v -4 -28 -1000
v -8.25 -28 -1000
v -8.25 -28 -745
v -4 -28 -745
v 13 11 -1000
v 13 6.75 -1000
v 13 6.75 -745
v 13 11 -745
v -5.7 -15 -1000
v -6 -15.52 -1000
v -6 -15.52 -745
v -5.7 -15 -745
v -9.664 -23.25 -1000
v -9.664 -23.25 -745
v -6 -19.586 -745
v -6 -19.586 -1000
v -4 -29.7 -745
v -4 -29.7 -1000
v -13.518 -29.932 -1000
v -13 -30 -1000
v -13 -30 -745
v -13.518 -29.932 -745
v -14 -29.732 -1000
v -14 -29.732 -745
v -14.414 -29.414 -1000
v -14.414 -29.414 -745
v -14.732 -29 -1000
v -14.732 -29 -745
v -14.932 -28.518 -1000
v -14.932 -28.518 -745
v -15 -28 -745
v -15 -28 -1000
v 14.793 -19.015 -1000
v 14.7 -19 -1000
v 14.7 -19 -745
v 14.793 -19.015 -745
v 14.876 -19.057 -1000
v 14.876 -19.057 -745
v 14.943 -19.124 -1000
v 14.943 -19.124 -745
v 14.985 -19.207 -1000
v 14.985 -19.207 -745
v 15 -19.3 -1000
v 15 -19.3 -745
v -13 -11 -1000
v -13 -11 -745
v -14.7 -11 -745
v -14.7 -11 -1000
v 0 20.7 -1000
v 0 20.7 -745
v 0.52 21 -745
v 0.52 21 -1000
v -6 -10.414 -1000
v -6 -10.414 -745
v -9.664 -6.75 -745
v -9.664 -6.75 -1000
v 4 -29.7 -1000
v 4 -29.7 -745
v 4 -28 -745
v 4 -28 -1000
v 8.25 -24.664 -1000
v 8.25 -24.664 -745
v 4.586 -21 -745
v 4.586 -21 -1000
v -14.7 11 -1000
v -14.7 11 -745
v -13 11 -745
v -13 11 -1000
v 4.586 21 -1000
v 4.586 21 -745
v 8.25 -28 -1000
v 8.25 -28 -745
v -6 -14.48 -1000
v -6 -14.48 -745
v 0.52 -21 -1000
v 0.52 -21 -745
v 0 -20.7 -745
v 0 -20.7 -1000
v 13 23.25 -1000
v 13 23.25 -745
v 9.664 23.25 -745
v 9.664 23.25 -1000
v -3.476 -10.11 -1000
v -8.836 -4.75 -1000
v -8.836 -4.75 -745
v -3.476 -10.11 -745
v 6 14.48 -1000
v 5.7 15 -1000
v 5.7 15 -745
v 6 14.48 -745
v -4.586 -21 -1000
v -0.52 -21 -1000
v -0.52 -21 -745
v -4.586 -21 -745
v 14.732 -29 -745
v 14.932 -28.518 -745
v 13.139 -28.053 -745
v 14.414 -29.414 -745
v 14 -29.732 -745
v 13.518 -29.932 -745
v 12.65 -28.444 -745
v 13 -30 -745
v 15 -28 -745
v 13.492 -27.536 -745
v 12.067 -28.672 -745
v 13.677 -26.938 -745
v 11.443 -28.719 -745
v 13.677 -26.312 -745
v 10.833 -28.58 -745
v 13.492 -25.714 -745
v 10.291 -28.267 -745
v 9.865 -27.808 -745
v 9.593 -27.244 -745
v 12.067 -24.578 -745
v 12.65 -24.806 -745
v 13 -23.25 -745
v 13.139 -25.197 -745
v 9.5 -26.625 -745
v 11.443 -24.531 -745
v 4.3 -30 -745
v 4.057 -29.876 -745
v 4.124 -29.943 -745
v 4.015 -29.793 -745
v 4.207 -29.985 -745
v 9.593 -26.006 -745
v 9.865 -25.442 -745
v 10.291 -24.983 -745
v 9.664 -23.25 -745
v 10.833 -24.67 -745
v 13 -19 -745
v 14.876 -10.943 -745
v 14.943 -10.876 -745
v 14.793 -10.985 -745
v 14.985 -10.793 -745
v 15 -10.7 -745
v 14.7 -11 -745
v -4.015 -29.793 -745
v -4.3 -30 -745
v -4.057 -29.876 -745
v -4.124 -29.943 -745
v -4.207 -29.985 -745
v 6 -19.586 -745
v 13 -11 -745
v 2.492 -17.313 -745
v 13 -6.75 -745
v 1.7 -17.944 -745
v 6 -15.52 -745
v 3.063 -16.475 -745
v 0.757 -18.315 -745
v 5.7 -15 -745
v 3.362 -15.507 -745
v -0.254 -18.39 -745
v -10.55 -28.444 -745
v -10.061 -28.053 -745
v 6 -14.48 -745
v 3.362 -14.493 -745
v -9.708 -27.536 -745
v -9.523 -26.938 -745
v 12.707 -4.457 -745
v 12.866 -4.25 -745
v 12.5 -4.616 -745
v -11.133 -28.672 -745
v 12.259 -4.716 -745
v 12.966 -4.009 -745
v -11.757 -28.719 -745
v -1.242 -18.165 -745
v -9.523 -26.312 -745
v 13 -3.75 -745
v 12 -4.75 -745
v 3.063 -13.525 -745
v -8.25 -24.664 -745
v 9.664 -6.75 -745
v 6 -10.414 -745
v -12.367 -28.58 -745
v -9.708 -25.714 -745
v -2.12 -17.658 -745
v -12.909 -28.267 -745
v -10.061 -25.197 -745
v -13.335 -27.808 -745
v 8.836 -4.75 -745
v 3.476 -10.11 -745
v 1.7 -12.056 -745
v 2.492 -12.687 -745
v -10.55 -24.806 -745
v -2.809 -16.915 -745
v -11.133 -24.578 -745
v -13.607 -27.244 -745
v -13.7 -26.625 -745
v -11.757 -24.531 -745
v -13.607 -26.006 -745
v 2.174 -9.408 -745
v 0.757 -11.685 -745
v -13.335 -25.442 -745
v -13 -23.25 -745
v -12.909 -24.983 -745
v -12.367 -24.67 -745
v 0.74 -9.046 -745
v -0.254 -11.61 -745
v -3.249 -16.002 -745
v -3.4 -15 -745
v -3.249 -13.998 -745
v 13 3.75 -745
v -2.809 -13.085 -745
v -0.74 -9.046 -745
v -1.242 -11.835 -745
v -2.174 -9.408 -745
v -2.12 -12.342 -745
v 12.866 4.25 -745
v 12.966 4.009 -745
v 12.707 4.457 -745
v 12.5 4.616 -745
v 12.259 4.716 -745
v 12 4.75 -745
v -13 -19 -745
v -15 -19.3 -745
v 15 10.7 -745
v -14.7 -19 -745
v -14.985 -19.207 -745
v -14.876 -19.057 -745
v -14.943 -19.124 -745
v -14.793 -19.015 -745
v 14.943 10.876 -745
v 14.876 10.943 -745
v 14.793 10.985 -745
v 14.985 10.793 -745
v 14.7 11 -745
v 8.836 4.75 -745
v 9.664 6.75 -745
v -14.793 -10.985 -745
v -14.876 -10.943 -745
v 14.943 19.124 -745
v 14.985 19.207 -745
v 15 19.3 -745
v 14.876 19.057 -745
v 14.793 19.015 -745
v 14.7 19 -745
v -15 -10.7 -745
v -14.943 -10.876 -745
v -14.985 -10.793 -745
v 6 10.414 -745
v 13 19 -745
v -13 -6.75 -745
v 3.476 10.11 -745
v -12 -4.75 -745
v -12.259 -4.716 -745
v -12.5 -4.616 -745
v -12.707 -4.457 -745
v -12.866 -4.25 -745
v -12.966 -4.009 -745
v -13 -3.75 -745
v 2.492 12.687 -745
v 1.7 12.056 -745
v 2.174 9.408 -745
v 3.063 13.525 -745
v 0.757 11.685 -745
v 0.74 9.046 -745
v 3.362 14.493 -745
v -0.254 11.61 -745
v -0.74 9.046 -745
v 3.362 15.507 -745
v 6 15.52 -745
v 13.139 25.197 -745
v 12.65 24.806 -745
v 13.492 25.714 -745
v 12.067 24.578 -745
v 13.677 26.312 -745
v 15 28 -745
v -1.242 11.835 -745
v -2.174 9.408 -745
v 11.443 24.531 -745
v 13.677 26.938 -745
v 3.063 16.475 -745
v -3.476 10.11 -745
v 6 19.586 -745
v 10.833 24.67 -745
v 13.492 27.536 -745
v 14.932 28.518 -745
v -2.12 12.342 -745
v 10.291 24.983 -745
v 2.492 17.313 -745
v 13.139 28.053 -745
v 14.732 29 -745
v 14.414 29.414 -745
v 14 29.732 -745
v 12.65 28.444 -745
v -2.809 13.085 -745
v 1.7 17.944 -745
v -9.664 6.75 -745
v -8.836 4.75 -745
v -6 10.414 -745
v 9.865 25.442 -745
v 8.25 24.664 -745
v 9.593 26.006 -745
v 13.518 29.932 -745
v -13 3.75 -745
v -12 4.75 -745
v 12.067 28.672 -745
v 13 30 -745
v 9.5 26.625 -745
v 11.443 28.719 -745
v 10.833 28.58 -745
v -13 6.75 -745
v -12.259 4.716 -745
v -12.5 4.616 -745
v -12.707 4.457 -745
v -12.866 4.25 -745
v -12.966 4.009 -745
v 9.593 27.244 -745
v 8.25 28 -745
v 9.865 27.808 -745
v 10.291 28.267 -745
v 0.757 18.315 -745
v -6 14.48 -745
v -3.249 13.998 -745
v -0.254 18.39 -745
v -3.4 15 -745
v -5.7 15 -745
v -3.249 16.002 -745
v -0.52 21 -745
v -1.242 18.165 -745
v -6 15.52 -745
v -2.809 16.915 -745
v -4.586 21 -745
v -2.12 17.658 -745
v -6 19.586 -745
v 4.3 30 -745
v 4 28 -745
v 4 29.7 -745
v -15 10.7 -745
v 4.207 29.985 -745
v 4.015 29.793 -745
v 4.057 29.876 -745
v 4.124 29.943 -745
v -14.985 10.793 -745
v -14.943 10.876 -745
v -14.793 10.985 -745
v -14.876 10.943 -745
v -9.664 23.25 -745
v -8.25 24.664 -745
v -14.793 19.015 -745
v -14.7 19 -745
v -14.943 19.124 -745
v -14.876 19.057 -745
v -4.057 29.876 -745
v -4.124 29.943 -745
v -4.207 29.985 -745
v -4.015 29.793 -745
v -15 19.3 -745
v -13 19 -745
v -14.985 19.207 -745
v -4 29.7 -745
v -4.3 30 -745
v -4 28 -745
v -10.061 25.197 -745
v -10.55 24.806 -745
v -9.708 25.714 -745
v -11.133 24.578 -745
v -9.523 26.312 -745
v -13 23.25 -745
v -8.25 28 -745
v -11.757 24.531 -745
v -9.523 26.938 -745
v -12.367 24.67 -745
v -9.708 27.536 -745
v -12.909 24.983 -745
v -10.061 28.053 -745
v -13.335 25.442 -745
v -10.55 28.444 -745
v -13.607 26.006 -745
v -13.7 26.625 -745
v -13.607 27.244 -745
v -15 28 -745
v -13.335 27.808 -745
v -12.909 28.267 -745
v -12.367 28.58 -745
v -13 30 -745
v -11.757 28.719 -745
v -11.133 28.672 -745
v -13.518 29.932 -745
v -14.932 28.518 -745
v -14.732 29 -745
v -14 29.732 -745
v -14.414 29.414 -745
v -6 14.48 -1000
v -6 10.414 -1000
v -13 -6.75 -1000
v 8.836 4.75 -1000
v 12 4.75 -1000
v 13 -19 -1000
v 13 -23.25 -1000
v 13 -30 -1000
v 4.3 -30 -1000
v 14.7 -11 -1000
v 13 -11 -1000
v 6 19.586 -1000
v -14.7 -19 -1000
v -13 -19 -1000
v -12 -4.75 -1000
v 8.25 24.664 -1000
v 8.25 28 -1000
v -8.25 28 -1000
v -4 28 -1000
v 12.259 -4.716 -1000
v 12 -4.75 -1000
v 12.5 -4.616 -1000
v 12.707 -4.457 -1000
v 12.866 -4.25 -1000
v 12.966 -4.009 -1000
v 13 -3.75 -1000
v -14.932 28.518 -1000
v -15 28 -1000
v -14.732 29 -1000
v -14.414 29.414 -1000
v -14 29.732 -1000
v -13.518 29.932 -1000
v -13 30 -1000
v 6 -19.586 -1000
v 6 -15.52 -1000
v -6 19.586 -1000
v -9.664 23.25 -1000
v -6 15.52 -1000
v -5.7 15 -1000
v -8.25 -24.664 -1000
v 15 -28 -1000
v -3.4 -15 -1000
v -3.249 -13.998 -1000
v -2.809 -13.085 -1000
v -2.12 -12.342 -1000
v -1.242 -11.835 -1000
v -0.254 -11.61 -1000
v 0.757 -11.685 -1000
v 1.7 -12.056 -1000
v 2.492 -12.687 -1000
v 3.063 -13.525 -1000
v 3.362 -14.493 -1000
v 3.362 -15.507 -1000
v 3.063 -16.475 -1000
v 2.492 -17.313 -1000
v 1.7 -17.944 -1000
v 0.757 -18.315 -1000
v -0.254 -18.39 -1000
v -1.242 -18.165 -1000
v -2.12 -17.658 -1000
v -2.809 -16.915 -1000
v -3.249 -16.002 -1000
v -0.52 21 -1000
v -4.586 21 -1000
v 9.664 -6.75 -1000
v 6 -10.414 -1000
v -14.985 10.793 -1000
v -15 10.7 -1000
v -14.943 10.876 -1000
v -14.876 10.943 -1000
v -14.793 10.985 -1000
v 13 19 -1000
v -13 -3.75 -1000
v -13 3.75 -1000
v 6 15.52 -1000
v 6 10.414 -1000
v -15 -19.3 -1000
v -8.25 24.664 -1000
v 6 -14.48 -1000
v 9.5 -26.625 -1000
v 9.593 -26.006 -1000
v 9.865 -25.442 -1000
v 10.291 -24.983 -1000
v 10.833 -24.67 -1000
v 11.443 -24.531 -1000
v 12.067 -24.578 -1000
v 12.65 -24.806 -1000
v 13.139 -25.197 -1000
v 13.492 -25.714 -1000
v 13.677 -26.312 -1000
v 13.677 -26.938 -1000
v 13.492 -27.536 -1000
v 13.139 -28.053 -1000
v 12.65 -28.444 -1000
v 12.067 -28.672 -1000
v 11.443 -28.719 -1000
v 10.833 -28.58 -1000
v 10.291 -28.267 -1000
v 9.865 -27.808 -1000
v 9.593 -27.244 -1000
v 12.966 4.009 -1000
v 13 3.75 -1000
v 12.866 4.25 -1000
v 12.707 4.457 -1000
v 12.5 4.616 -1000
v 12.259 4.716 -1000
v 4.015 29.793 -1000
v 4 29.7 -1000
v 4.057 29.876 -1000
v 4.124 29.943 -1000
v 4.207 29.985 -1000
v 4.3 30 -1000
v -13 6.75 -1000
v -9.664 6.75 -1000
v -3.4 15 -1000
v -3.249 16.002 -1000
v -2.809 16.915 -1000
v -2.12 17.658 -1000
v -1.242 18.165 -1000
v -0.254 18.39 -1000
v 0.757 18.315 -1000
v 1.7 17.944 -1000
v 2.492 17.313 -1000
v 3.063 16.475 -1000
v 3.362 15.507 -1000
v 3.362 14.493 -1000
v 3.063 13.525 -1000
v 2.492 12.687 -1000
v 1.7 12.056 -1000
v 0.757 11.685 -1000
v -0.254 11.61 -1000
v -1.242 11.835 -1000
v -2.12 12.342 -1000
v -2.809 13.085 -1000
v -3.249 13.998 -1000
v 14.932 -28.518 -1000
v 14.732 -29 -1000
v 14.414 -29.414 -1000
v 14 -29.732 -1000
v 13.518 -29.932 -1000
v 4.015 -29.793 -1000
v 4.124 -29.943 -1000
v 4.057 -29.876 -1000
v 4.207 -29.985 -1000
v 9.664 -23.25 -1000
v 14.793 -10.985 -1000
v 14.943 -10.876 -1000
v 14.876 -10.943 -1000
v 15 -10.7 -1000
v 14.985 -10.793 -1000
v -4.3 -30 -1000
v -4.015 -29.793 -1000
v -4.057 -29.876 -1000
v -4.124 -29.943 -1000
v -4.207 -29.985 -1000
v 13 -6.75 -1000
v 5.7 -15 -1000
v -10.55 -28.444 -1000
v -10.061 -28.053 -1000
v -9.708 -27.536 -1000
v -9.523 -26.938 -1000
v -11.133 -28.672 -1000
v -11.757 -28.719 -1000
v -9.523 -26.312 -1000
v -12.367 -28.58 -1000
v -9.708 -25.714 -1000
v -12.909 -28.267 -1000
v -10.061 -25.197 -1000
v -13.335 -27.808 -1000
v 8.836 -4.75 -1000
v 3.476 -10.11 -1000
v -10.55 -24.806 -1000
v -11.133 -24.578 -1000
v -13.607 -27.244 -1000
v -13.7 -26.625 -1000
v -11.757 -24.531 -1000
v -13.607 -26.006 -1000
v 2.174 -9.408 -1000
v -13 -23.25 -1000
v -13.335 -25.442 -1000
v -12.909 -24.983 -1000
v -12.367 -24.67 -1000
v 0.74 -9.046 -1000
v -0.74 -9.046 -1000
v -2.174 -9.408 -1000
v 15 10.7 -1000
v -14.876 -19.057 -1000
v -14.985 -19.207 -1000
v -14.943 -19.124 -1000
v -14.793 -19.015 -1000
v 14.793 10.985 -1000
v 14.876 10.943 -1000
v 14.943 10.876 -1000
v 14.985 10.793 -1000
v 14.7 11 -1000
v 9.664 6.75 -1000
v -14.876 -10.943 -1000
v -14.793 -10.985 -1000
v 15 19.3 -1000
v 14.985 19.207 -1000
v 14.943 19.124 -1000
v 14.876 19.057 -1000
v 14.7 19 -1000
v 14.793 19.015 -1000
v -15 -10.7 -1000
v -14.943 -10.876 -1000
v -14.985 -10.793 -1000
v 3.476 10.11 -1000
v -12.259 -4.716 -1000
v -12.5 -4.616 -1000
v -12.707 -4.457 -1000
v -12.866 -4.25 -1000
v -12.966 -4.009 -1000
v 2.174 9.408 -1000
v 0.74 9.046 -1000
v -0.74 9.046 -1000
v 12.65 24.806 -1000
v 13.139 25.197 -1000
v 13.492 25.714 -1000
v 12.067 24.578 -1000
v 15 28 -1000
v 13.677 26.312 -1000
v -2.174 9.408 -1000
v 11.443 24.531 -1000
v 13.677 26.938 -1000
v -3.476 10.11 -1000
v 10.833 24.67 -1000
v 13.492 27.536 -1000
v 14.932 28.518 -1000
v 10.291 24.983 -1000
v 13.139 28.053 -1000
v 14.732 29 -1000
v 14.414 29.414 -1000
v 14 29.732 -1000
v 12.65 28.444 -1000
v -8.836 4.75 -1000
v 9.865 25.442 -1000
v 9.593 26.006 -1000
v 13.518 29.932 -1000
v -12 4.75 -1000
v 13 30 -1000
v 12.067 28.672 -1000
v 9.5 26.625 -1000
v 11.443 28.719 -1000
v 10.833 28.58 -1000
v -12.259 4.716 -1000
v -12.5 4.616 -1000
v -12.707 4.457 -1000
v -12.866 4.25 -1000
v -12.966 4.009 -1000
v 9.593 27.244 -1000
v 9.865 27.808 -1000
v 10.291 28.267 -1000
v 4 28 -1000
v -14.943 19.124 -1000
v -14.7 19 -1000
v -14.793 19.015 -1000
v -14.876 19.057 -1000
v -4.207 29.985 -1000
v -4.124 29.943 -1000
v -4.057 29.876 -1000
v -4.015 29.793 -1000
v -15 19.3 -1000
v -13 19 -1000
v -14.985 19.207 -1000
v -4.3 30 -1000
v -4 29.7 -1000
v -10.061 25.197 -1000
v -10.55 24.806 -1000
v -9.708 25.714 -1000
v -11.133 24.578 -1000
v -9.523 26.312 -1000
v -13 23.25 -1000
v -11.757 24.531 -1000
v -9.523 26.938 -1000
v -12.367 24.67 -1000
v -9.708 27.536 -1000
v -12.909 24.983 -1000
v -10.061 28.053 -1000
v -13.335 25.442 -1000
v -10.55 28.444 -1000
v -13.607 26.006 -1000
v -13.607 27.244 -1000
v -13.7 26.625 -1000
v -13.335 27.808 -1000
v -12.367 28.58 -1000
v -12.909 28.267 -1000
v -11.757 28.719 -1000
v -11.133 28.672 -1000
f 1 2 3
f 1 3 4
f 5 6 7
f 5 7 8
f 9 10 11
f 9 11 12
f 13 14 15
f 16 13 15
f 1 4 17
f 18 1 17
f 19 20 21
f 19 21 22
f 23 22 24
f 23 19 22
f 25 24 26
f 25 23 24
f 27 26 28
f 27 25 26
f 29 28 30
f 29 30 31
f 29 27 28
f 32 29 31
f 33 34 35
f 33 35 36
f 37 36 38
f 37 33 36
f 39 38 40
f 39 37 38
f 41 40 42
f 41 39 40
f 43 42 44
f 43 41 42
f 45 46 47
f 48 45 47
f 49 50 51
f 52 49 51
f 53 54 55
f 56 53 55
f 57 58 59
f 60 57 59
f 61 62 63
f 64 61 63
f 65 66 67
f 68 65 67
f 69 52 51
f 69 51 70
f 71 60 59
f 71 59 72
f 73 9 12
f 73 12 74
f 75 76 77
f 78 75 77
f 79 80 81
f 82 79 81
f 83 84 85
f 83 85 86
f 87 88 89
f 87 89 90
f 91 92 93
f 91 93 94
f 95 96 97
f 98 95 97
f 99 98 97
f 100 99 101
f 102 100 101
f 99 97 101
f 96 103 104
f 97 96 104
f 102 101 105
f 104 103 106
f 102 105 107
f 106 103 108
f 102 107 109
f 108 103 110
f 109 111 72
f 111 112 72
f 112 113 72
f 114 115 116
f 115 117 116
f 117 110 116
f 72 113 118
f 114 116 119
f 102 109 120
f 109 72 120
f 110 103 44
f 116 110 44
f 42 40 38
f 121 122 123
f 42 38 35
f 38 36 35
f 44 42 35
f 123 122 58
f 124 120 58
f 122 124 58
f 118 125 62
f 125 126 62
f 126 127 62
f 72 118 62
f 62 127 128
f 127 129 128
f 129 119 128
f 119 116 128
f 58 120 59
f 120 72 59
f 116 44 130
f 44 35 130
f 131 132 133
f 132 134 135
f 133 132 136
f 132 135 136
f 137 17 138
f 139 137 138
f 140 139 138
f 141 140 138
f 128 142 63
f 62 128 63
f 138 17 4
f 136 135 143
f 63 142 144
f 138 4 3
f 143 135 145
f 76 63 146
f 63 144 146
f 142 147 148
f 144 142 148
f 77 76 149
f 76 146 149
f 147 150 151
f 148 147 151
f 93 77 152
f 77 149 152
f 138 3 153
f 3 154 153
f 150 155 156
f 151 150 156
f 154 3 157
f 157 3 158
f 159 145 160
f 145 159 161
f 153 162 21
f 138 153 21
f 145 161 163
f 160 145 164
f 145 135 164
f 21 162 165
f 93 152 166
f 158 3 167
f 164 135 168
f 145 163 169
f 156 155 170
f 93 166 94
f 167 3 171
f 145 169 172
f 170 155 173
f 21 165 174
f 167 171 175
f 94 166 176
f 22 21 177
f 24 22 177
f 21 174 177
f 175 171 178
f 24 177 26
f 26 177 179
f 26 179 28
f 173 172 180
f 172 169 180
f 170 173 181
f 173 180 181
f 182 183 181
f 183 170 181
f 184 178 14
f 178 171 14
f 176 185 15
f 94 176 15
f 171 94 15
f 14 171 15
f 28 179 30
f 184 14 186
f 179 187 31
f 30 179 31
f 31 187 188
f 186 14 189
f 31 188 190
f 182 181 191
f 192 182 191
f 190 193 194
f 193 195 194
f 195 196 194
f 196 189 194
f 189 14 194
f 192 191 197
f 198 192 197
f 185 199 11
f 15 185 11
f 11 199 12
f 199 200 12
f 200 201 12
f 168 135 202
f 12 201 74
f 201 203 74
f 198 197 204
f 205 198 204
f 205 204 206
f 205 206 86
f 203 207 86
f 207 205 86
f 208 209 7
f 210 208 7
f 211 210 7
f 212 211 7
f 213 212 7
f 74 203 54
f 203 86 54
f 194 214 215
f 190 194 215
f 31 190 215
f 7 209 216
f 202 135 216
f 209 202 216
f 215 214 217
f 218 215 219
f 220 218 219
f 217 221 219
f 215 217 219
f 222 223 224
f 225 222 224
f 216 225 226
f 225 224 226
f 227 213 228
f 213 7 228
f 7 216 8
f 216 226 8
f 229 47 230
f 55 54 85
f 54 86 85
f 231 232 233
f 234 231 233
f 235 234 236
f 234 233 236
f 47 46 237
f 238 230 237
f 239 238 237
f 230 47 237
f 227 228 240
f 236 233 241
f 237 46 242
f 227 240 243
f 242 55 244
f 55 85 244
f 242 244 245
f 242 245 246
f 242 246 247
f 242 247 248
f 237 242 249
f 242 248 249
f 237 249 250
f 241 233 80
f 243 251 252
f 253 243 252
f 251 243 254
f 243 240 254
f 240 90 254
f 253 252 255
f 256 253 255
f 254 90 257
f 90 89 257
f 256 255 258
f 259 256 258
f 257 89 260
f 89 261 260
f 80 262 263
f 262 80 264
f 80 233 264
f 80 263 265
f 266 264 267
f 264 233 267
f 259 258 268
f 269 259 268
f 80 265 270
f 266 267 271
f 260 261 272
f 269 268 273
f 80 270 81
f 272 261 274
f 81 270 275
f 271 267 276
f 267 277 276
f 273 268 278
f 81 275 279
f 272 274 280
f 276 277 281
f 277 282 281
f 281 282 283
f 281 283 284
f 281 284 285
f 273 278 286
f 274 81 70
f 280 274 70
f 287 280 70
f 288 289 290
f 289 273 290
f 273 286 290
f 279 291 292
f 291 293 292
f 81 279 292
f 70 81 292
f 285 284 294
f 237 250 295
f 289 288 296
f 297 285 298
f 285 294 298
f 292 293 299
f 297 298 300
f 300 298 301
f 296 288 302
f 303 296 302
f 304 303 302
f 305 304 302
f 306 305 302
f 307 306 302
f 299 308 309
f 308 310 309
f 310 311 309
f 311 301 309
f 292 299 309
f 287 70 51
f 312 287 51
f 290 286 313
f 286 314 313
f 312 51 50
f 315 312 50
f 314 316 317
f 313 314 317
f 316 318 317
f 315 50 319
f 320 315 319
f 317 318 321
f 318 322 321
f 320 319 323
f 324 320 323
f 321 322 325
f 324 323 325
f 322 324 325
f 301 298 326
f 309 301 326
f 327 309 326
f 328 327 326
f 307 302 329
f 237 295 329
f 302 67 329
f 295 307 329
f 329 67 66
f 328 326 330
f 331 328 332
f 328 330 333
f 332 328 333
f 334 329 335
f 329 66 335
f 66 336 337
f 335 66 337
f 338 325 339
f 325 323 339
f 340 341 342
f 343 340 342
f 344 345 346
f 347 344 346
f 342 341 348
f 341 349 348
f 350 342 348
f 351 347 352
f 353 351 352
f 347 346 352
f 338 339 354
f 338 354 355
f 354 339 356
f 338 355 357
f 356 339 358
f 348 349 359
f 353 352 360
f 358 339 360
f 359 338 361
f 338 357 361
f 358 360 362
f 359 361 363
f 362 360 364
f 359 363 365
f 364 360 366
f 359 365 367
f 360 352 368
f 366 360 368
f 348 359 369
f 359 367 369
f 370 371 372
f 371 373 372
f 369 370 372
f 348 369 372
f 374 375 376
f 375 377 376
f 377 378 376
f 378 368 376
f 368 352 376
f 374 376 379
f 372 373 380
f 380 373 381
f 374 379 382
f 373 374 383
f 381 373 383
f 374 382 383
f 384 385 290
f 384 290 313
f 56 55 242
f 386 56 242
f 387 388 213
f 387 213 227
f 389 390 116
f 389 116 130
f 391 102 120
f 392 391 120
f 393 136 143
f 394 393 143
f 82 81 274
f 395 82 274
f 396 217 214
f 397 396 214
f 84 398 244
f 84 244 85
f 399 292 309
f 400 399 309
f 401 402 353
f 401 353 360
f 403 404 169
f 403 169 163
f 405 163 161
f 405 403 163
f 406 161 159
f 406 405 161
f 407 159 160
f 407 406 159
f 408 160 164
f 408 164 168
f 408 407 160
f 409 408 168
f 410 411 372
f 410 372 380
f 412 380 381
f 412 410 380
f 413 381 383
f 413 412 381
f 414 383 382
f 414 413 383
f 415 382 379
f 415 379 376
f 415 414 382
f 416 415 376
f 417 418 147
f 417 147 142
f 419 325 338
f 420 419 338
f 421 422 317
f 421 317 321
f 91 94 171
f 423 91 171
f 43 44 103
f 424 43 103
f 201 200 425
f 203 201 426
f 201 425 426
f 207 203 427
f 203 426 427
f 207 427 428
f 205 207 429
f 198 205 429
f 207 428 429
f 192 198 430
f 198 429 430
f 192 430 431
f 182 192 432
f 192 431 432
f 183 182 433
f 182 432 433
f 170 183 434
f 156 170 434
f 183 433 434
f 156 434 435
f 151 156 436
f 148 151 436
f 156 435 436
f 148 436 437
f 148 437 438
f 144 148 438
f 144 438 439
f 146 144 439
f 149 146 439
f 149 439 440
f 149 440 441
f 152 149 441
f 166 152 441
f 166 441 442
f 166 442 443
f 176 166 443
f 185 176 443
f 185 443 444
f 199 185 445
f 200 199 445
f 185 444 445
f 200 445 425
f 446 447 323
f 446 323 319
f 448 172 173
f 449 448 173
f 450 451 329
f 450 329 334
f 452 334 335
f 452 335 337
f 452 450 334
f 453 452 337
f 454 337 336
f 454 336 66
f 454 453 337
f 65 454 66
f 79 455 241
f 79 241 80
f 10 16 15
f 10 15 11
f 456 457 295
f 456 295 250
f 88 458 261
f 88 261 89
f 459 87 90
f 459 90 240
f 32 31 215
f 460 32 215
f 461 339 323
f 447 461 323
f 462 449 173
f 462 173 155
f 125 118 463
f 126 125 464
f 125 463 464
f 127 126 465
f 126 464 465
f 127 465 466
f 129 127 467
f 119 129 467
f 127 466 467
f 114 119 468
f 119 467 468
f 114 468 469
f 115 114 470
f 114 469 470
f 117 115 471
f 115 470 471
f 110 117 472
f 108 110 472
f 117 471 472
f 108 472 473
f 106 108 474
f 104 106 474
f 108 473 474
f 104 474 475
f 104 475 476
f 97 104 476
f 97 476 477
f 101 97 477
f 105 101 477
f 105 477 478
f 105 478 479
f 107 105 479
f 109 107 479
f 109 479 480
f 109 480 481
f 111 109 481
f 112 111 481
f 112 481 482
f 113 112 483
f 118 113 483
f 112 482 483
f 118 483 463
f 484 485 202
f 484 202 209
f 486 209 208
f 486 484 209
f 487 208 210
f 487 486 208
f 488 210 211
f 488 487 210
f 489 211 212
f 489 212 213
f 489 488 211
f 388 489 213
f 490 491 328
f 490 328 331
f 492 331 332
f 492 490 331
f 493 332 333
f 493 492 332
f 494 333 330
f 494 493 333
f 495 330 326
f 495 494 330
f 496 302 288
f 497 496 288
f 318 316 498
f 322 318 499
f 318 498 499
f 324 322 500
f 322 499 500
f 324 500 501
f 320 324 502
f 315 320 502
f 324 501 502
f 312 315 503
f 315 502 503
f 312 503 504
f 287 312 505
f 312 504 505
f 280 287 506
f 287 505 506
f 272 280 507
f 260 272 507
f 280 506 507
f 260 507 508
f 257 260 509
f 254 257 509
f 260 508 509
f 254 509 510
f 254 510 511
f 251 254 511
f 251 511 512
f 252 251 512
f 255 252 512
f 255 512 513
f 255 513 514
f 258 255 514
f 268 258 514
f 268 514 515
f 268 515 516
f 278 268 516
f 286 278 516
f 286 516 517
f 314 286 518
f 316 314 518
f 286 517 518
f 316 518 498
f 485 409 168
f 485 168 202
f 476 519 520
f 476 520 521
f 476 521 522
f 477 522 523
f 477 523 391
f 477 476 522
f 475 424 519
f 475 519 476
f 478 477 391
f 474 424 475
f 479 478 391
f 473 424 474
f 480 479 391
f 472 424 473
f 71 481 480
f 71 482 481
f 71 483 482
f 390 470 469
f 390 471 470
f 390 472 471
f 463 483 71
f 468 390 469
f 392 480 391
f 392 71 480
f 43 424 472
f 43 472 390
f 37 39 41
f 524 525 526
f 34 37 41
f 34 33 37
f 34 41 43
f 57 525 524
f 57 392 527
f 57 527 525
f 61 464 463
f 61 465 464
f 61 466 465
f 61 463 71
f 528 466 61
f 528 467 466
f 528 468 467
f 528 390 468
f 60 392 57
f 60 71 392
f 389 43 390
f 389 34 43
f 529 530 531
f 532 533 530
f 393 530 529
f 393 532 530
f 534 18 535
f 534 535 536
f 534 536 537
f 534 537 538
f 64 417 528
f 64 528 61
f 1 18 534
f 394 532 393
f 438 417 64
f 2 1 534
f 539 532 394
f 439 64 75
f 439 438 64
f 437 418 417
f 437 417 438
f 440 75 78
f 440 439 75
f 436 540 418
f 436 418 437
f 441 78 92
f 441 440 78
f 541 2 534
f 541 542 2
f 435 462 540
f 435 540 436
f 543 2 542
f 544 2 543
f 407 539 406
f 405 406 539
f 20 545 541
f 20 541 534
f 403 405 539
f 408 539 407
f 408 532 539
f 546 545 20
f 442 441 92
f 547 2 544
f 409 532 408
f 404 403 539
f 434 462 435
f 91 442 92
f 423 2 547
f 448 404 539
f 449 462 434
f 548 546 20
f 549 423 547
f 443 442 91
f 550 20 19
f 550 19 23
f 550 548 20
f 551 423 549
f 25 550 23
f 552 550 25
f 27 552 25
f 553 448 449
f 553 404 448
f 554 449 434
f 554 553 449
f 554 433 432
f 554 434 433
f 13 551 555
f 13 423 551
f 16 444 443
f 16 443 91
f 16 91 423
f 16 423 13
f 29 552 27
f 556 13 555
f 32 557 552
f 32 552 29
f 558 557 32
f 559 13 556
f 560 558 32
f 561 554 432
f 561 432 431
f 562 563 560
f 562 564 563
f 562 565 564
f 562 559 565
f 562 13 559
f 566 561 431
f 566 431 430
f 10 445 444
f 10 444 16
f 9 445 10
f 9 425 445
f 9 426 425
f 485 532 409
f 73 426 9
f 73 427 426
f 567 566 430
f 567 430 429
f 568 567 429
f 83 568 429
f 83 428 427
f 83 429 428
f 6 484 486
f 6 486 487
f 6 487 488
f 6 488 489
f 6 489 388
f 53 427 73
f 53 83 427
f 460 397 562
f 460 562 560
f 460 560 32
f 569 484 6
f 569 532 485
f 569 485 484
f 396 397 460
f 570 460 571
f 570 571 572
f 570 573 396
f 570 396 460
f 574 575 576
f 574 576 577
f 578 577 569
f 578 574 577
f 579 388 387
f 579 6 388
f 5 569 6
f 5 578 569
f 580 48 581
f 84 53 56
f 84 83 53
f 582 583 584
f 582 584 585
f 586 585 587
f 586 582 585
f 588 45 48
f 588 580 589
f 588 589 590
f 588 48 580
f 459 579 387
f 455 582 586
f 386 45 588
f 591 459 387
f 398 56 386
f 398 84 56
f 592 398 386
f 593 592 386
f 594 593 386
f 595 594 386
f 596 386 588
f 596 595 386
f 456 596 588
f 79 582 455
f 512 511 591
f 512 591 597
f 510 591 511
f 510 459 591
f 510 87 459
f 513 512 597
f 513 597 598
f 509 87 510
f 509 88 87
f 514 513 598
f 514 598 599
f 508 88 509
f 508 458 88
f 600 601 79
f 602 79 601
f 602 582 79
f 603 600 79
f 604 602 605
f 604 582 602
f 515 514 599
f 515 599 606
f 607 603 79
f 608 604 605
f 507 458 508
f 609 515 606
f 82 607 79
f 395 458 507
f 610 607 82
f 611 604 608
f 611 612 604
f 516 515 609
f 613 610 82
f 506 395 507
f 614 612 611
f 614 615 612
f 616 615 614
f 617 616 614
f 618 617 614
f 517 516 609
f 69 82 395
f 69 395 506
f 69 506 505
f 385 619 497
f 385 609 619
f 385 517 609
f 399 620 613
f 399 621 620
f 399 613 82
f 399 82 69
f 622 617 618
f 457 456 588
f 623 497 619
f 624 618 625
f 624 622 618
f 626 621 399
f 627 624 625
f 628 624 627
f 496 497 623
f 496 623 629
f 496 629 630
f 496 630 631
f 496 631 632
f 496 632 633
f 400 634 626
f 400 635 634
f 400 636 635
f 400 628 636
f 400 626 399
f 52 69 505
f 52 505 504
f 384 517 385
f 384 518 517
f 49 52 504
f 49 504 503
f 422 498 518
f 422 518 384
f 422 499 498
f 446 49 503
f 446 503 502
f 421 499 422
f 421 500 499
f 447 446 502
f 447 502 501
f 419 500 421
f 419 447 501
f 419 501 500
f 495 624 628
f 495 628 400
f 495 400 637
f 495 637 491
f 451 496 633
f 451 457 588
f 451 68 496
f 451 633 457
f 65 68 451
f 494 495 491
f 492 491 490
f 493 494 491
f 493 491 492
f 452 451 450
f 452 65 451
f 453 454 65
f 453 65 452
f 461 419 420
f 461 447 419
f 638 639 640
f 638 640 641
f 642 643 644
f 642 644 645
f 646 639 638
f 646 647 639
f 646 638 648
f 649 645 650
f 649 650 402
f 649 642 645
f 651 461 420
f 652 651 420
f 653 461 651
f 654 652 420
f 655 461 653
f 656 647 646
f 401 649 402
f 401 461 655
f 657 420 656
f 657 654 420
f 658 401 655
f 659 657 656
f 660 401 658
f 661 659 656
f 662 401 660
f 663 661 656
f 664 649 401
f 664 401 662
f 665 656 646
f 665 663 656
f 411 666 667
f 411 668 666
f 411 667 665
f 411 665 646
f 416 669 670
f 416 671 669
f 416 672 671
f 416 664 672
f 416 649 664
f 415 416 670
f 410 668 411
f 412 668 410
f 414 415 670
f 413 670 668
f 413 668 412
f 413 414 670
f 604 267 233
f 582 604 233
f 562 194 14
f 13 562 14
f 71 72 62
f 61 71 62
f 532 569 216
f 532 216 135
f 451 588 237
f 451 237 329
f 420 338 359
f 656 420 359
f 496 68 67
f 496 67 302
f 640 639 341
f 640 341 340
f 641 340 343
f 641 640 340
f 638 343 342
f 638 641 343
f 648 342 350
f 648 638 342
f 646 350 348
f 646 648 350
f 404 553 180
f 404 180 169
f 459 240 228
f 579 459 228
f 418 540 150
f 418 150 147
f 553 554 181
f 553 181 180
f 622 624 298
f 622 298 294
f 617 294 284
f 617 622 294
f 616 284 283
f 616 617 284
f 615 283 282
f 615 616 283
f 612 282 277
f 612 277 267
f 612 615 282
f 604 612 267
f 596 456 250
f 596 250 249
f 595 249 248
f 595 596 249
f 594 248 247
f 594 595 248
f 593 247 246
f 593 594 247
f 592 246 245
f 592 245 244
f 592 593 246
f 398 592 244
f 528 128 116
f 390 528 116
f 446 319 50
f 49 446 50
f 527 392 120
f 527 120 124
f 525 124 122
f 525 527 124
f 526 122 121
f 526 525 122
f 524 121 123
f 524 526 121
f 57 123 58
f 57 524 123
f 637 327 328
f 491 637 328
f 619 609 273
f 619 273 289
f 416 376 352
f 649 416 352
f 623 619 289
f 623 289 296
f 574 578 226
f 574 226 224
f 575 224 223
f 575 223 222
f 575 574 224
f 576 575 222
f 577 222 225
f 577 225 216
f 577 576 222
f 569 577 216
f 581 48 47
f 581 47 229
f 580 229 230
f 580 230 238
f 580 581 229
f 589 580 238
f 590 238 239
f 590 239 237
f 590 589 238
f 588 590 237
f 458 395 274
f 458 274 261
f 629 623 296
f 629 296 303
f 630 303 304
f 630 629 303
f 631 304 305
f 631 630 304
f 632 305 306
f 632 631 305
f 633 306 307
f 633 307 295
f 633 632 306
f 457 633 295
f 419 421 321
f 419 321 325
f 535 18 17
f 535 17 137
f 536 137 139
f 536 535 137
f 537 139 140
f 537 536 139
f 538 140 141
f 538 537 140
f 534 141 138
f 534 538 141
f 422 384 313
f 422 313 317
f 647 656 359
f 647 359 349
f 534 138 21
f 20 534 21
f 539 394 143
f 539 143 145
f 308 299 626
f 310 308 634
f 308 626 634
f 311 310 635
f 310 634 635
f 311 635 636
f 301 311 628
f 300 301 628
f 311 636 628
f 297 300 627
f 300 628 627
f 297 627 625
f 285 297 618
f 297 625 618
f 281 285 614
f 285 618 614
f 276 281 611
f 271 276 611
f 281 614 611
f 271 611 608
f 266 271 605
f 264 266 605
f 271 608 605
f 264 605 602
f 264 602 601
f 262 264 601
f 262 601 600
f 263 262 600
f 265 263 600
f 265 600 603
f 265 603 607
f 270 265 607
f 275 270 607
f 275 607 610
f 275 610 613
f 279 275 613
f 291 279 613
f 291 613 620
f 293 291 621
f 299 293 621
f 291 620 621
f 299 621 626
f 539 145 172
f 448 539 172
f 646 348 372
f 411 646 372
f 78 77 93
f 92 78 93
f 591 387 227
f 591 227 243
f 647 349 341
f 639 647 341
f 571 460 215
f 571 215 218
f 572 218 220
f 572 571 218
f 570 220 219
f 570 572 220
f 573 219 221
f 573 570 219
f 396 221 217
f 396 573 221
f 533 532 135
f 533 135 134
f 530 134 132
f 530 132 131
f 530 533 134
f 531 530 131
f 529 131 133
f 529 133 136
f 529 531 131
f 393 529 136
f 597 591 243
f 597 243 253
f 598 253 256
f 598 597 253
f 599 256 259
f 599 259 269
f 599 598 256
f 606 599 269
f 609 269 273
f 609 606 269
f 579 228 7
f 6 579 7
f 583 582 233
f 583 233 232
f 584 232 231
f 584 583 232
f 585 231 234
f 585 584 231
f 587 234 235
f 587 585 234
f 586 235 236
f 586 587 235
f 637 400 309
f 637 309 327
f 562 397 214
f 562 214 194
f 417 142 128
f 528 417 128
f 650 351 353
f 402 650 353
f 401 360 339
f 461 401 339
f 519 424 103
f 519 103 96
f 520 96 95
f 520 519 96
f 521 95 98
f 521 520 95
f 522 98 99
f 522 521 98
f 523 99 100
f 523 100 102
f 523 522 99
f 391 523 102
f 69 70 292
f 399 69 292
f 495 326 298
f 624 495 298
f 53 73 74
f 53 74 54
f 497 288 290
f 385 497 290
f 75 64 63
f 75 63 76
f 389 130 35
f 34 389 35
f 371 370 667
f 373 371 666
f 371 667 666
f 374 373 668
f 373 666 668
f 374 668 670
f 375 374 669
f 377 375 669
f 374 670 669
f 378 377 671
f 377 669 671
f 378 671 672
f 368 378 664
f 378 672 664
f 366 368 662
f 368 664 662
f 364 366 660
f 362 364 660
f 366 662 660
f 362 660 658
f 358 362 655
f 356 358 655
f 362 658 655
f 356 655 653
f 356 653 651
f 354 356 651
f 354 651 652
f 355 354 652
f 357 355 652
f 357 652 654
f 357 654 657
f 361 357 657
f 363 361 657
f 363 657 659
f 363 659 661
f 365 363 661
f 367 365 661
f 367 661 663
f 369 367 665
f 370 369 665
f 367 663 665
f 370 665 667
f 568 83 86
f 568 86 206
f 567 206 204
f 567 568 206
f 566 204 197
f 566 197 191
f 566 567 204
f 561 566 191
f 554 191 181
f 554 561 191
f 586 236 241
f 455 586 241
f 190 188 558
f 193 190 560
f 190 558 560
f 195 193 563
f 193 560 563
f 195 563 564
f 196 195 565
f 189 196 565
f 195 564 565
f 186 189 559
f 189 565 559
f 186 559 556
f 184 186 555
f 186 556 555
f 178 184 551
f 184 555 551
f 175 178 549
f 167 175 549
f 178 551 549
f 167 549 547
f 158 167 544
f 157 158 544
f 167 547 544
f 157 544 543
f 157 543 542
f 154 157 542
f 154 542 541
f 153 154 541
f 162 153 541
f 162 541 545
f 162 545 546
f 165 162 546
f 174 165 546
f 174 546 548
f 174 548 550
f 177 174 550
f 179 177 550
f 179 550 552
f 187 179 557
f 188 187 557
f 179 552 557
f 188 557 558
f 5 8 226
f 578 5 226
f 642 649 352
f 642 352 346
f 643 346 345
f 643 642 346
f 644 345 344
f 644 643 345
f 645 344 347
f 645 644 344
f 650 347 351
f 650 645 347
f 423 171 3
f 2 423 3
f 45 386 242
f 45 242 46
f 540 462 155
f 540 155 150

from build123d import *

# Parameters (mm, degrees)
SKETCH1_R           = 2.1
SKETCH1_R_2         = 3.4
BOSS_EXTRUDE1_DEPTH = 255


with BuildPart() as part:
    # Sketch1 → Boss-Extrude1 (new body)
    with BuildSketch(Plane(origin=(0, 0, -1000), x_dir=(-1, 0, 0), z_dir=(0, 0, -1))):
        with BuildLine():
            Line((15, -28), (15, -19.3))
            ThreePointArc((15, -19.3), (14.912132034, -19.087867966), (14.7, -19))
            Line((14.7, -19), (13, -19))
            Line((13, -19), (13, -23.25))
            Line((13, -23.25), (9.6642, -23.25))
            Line((9.6642, -23.25), (6, -19.5858))
            Line((6, -19.5858), (6, -15.519615242))
            Line((6, -15.519615242), (5.7, -15))
            Line((5.7, -15), (6, -14.480384758))
            Line((6, -14.480384758), (6, -10.4142))
            Line((6, -10.4142), (9.6642, -6.75))
            Line((9.6642, -6.75), (13, -6.75))
            Line((13, -6.75), (13, -11))
            Line((13, -11), (14.7, -11))
            ThreePointArc((14.7, -11), (14.912132034, -10.912132034), (15, -10.7))
            Line((15, -10.7), (15, 10.7))
            ThreePointArc((15, 10.7), (14.912132034, 10.912132034), (14.7, 11))
            Line((14.7, 11), (13, 11))
            Line((13, 11), (13, 6.75))
            Line((13, 6.75), (9.6642, 6.75))
            Line((9.6642, 6.75), (6, 10.4142))
            Line((6, 10.4142), (6, 14.480384758))
            Line((6, 14.480384758), (5.7, 15))
            Line((5.7, 15), (6, 15.519615242))
            Line((6, 15.519615242), (6, 19.5858))
            Line((6, 19.5858), (9.6642, 23.25))
            Line((9.6642, 23.25), (13, 23.25))
            Line((13, 23.25), (13, 19))
            Line((13, 19), (14.7, 19))
            ThreePointArc((14.7, 19), (14.912132034, 19.087867966), (15, 19.3))
            Line((15, 19.3), (15, 28))
            ThreePointArc((15, 28), (14.414213562, 29.414213562), (13, 30))
            Line((13, 30), (4.3, 30))
            ThreePointArc((4.3, 30), (4.087867966, 29.912132034), (4, 29.7))
            Line((4, 29.7), (4, 28))
            Line((4, 28), (8.25, 28))
            Line((8.25, 28), (8.25, 24.6642))
            Line((8.25, 24.6642), (4.5858, 21))
            Line((4.5858, 21), (0.519615242, 21))
            Line((0.519615242, 21), (0, 20.7))
            Line((0, 20.7), (-0.519615242, 21))
            Line((-0.519615242, 21), (-4.5858, 21))
            Line((-4.5858, 21), (-8.25, 24.6642))
            Line((-8.25, 24.6642), (-8.25, 28))
            Line((-8.25, 28), (-4, 28))
            Line((-4, 28), (-4, 29.7))
            ThreePointArc((-4, 29.7), (-4.087867966, 29.912132034), (-4.3, 30))
            Line((-4.3, 30), (-13, 30))
            ThreePointArc((-13, 30), (-14.414213562, 29.414213562), (-15, 28))
            Line((-15, 28), (-15, 19.3))
            ThreePointArc((-15, 19.3), (-14.912132034, 19.087867966), (-14.7, 19))
            Line((-14.7, 19), (-13, 19))
            Line((-13, 19), (-13, 23.25))
            Line((-13, 23.25), (-9.6642, 23.25))
            Line((-9.6642, 23.25), (-6, 19.5858))
            Line((-6, 19.5858), (-6, 15.519615242))
            Line((-6, 15.519615242), (-5.7, 15))
            Line((-5.7, 15), (-6, 14.480384758))
            Line((-6, 14.480384758), (-6, 10.4142))
            Line((-6, 10.4142), (-9.6642, 6.75))
            Line((-9.6642, 6.75), (-13, 6.75))
            Line((-13, 6.75), (-13, 11))
            Line((-13, 11), (-14.7, 11))
            ThreePointArc((-14.7, 11), (-14.912132034, 10.912132034), (-15, 10.7))
            Line((-15, 10.7), (-15, -10.7))
            ThreePointArc((-15, -10.7), (-14.912132034, -10.912132034), (-14.7, -11))
            Line((-14.7, -11), (-13, -11))
            Line((-13, -11), (-13, -6.75))
            Line((-13, -6.75), (-9.6642, -6.75))
            Line((-9.6642, -6.75), (-6, -10.4142))
            Line((-6, -10.4142), (-6, -14.480384758))
            Line((-6, -14.480384758), (-5.7, -15))
            Line((-5.7, -15), (-6, -15.519615242))
            Line((-6, -15.519615242), (-6, -19.5858))
            Line((-6, -19.5858), (-9.6642, -23.25))
            Line((-9.6642, -23.25), (-13, -23.25))
            Line((-13, -23.25), (-13, -19))
            Line((-13, -19), (-14.7, -19))
            ThreePointArc((-14.7, -19), (-14.912132034, -19.087867966), (-15, -19.3))
            Line((-15, -19.3), (-15, -28))
            ThreePointArc((-15, -28), (-14.414213562, -29.414213562), (-13, -30))
            Line((-13, -30), (-4.3, -30))
            ThreePointArc((-4.3, -30), (-4.087867966, -29.912132034), (-4, -29.7))
            Line((-4, -29.7), (-4, -28))
            Line((-4, -28), (-8.25, -28))
            Line((-8.25, -28), (-8.25, -24.6642))
            Line((-8.25, -24.6642), (-4.5858, -21))
            Line((-4.5858, -21), (-0.519615242, -21))
            Line((-0.519615242, -21), (0, -20.7))
            Line((0, -20.7), (0.519615242, -21))
            Line((0.519615242, -21), (4.5858, -21))
            Line((4.5858, -21), (8.25, -24.6642))
            Line((8.25, -24.6642), (8.25, -28))
            Line((8.25, -28), (4, -28))
            Line((4, -28), (4, -29.7))
            ThreePointArc((4, -29.7), (4.087867966, -29.912132034), (4.3, -30))
            Line((4.3, -30), (13, -30))
            ThreePointArc((13, -30), (14.414213562, -29.414213562), (15, -28))
        make_face()
        with Locations((11.6, 26.625)):
            Circle(SKETCH1_R, mode=Mode.SUBTRACT)
        with Locations((11.6, -26.625)):
            Circle(SKETCH1_R, mode=Mode.SUBTRACT)
        with Locations((0, -15)):
            Circle(SKETCH1_R_2, mode=Mode.SUBTRACT)
        with Locations((0, 15)):
            Circle(SKETCH1_R_2, mode=Mode.SUBTRACT)
        with Locations((-11.6, 26.625)):
            Circle(SKETCH1_R, mode=Mode.SUBTRACT)
        with Locations((-11.6, -26.625)):
            Circle(SKETCH1_R, mode=Mode.SUBTRACT)
        with BuildLine():
            Line((13, 3.75), (13, -3.75))
            ThreePointArc((13, -3.75), (12.707106781, -4.457106781), (12, -4.75))
            Line((12, -4.75), (8.8358, -4.75))
            Line((8.8358, -4.75), (3.476201279, -10.109598721))
            ThreePointArc((3.476201279, -10.109598721), (0, -9), (-3.476201279, -10.109598721))
            Line((-3.476201279, -10.109598721), (-8.8358, -4.75))
            Line((-8.8358, -4.75), (-12, -4.75))
            ThreePointArc((-12, -4.75), (-12.707106781, -4.457106781), (-13, -3.75))
            Line((-13, -3.75), (-13, 3.75))
            ThreePointArc((-13, 3.75), (-12.707106781, 4.457106781), (-12, 4.75))
            Line((-12, 4.75), (-8.8358, 4.75))
            Line((-8.8358, 4.75), (-3.476201279, 10.109598721))
            ThreePointArc((-3.476201279, 10.109598721), (0, 9), (3.476201279, 10.109598721))
            Line((3.476201279, 10.109598721), (8.8358, 4.75))
            Line((8.8358, 4.75), (12, 4.75))
            ThreePointArc((12, 4.75), (12.707106781, 4.457106781), (13, 3.75))
        make_face(mode=Mode.SUBTRACT)
    extrude(amount=-BOSS_EXTRUDE1_DEPTH)


solid = part.part
